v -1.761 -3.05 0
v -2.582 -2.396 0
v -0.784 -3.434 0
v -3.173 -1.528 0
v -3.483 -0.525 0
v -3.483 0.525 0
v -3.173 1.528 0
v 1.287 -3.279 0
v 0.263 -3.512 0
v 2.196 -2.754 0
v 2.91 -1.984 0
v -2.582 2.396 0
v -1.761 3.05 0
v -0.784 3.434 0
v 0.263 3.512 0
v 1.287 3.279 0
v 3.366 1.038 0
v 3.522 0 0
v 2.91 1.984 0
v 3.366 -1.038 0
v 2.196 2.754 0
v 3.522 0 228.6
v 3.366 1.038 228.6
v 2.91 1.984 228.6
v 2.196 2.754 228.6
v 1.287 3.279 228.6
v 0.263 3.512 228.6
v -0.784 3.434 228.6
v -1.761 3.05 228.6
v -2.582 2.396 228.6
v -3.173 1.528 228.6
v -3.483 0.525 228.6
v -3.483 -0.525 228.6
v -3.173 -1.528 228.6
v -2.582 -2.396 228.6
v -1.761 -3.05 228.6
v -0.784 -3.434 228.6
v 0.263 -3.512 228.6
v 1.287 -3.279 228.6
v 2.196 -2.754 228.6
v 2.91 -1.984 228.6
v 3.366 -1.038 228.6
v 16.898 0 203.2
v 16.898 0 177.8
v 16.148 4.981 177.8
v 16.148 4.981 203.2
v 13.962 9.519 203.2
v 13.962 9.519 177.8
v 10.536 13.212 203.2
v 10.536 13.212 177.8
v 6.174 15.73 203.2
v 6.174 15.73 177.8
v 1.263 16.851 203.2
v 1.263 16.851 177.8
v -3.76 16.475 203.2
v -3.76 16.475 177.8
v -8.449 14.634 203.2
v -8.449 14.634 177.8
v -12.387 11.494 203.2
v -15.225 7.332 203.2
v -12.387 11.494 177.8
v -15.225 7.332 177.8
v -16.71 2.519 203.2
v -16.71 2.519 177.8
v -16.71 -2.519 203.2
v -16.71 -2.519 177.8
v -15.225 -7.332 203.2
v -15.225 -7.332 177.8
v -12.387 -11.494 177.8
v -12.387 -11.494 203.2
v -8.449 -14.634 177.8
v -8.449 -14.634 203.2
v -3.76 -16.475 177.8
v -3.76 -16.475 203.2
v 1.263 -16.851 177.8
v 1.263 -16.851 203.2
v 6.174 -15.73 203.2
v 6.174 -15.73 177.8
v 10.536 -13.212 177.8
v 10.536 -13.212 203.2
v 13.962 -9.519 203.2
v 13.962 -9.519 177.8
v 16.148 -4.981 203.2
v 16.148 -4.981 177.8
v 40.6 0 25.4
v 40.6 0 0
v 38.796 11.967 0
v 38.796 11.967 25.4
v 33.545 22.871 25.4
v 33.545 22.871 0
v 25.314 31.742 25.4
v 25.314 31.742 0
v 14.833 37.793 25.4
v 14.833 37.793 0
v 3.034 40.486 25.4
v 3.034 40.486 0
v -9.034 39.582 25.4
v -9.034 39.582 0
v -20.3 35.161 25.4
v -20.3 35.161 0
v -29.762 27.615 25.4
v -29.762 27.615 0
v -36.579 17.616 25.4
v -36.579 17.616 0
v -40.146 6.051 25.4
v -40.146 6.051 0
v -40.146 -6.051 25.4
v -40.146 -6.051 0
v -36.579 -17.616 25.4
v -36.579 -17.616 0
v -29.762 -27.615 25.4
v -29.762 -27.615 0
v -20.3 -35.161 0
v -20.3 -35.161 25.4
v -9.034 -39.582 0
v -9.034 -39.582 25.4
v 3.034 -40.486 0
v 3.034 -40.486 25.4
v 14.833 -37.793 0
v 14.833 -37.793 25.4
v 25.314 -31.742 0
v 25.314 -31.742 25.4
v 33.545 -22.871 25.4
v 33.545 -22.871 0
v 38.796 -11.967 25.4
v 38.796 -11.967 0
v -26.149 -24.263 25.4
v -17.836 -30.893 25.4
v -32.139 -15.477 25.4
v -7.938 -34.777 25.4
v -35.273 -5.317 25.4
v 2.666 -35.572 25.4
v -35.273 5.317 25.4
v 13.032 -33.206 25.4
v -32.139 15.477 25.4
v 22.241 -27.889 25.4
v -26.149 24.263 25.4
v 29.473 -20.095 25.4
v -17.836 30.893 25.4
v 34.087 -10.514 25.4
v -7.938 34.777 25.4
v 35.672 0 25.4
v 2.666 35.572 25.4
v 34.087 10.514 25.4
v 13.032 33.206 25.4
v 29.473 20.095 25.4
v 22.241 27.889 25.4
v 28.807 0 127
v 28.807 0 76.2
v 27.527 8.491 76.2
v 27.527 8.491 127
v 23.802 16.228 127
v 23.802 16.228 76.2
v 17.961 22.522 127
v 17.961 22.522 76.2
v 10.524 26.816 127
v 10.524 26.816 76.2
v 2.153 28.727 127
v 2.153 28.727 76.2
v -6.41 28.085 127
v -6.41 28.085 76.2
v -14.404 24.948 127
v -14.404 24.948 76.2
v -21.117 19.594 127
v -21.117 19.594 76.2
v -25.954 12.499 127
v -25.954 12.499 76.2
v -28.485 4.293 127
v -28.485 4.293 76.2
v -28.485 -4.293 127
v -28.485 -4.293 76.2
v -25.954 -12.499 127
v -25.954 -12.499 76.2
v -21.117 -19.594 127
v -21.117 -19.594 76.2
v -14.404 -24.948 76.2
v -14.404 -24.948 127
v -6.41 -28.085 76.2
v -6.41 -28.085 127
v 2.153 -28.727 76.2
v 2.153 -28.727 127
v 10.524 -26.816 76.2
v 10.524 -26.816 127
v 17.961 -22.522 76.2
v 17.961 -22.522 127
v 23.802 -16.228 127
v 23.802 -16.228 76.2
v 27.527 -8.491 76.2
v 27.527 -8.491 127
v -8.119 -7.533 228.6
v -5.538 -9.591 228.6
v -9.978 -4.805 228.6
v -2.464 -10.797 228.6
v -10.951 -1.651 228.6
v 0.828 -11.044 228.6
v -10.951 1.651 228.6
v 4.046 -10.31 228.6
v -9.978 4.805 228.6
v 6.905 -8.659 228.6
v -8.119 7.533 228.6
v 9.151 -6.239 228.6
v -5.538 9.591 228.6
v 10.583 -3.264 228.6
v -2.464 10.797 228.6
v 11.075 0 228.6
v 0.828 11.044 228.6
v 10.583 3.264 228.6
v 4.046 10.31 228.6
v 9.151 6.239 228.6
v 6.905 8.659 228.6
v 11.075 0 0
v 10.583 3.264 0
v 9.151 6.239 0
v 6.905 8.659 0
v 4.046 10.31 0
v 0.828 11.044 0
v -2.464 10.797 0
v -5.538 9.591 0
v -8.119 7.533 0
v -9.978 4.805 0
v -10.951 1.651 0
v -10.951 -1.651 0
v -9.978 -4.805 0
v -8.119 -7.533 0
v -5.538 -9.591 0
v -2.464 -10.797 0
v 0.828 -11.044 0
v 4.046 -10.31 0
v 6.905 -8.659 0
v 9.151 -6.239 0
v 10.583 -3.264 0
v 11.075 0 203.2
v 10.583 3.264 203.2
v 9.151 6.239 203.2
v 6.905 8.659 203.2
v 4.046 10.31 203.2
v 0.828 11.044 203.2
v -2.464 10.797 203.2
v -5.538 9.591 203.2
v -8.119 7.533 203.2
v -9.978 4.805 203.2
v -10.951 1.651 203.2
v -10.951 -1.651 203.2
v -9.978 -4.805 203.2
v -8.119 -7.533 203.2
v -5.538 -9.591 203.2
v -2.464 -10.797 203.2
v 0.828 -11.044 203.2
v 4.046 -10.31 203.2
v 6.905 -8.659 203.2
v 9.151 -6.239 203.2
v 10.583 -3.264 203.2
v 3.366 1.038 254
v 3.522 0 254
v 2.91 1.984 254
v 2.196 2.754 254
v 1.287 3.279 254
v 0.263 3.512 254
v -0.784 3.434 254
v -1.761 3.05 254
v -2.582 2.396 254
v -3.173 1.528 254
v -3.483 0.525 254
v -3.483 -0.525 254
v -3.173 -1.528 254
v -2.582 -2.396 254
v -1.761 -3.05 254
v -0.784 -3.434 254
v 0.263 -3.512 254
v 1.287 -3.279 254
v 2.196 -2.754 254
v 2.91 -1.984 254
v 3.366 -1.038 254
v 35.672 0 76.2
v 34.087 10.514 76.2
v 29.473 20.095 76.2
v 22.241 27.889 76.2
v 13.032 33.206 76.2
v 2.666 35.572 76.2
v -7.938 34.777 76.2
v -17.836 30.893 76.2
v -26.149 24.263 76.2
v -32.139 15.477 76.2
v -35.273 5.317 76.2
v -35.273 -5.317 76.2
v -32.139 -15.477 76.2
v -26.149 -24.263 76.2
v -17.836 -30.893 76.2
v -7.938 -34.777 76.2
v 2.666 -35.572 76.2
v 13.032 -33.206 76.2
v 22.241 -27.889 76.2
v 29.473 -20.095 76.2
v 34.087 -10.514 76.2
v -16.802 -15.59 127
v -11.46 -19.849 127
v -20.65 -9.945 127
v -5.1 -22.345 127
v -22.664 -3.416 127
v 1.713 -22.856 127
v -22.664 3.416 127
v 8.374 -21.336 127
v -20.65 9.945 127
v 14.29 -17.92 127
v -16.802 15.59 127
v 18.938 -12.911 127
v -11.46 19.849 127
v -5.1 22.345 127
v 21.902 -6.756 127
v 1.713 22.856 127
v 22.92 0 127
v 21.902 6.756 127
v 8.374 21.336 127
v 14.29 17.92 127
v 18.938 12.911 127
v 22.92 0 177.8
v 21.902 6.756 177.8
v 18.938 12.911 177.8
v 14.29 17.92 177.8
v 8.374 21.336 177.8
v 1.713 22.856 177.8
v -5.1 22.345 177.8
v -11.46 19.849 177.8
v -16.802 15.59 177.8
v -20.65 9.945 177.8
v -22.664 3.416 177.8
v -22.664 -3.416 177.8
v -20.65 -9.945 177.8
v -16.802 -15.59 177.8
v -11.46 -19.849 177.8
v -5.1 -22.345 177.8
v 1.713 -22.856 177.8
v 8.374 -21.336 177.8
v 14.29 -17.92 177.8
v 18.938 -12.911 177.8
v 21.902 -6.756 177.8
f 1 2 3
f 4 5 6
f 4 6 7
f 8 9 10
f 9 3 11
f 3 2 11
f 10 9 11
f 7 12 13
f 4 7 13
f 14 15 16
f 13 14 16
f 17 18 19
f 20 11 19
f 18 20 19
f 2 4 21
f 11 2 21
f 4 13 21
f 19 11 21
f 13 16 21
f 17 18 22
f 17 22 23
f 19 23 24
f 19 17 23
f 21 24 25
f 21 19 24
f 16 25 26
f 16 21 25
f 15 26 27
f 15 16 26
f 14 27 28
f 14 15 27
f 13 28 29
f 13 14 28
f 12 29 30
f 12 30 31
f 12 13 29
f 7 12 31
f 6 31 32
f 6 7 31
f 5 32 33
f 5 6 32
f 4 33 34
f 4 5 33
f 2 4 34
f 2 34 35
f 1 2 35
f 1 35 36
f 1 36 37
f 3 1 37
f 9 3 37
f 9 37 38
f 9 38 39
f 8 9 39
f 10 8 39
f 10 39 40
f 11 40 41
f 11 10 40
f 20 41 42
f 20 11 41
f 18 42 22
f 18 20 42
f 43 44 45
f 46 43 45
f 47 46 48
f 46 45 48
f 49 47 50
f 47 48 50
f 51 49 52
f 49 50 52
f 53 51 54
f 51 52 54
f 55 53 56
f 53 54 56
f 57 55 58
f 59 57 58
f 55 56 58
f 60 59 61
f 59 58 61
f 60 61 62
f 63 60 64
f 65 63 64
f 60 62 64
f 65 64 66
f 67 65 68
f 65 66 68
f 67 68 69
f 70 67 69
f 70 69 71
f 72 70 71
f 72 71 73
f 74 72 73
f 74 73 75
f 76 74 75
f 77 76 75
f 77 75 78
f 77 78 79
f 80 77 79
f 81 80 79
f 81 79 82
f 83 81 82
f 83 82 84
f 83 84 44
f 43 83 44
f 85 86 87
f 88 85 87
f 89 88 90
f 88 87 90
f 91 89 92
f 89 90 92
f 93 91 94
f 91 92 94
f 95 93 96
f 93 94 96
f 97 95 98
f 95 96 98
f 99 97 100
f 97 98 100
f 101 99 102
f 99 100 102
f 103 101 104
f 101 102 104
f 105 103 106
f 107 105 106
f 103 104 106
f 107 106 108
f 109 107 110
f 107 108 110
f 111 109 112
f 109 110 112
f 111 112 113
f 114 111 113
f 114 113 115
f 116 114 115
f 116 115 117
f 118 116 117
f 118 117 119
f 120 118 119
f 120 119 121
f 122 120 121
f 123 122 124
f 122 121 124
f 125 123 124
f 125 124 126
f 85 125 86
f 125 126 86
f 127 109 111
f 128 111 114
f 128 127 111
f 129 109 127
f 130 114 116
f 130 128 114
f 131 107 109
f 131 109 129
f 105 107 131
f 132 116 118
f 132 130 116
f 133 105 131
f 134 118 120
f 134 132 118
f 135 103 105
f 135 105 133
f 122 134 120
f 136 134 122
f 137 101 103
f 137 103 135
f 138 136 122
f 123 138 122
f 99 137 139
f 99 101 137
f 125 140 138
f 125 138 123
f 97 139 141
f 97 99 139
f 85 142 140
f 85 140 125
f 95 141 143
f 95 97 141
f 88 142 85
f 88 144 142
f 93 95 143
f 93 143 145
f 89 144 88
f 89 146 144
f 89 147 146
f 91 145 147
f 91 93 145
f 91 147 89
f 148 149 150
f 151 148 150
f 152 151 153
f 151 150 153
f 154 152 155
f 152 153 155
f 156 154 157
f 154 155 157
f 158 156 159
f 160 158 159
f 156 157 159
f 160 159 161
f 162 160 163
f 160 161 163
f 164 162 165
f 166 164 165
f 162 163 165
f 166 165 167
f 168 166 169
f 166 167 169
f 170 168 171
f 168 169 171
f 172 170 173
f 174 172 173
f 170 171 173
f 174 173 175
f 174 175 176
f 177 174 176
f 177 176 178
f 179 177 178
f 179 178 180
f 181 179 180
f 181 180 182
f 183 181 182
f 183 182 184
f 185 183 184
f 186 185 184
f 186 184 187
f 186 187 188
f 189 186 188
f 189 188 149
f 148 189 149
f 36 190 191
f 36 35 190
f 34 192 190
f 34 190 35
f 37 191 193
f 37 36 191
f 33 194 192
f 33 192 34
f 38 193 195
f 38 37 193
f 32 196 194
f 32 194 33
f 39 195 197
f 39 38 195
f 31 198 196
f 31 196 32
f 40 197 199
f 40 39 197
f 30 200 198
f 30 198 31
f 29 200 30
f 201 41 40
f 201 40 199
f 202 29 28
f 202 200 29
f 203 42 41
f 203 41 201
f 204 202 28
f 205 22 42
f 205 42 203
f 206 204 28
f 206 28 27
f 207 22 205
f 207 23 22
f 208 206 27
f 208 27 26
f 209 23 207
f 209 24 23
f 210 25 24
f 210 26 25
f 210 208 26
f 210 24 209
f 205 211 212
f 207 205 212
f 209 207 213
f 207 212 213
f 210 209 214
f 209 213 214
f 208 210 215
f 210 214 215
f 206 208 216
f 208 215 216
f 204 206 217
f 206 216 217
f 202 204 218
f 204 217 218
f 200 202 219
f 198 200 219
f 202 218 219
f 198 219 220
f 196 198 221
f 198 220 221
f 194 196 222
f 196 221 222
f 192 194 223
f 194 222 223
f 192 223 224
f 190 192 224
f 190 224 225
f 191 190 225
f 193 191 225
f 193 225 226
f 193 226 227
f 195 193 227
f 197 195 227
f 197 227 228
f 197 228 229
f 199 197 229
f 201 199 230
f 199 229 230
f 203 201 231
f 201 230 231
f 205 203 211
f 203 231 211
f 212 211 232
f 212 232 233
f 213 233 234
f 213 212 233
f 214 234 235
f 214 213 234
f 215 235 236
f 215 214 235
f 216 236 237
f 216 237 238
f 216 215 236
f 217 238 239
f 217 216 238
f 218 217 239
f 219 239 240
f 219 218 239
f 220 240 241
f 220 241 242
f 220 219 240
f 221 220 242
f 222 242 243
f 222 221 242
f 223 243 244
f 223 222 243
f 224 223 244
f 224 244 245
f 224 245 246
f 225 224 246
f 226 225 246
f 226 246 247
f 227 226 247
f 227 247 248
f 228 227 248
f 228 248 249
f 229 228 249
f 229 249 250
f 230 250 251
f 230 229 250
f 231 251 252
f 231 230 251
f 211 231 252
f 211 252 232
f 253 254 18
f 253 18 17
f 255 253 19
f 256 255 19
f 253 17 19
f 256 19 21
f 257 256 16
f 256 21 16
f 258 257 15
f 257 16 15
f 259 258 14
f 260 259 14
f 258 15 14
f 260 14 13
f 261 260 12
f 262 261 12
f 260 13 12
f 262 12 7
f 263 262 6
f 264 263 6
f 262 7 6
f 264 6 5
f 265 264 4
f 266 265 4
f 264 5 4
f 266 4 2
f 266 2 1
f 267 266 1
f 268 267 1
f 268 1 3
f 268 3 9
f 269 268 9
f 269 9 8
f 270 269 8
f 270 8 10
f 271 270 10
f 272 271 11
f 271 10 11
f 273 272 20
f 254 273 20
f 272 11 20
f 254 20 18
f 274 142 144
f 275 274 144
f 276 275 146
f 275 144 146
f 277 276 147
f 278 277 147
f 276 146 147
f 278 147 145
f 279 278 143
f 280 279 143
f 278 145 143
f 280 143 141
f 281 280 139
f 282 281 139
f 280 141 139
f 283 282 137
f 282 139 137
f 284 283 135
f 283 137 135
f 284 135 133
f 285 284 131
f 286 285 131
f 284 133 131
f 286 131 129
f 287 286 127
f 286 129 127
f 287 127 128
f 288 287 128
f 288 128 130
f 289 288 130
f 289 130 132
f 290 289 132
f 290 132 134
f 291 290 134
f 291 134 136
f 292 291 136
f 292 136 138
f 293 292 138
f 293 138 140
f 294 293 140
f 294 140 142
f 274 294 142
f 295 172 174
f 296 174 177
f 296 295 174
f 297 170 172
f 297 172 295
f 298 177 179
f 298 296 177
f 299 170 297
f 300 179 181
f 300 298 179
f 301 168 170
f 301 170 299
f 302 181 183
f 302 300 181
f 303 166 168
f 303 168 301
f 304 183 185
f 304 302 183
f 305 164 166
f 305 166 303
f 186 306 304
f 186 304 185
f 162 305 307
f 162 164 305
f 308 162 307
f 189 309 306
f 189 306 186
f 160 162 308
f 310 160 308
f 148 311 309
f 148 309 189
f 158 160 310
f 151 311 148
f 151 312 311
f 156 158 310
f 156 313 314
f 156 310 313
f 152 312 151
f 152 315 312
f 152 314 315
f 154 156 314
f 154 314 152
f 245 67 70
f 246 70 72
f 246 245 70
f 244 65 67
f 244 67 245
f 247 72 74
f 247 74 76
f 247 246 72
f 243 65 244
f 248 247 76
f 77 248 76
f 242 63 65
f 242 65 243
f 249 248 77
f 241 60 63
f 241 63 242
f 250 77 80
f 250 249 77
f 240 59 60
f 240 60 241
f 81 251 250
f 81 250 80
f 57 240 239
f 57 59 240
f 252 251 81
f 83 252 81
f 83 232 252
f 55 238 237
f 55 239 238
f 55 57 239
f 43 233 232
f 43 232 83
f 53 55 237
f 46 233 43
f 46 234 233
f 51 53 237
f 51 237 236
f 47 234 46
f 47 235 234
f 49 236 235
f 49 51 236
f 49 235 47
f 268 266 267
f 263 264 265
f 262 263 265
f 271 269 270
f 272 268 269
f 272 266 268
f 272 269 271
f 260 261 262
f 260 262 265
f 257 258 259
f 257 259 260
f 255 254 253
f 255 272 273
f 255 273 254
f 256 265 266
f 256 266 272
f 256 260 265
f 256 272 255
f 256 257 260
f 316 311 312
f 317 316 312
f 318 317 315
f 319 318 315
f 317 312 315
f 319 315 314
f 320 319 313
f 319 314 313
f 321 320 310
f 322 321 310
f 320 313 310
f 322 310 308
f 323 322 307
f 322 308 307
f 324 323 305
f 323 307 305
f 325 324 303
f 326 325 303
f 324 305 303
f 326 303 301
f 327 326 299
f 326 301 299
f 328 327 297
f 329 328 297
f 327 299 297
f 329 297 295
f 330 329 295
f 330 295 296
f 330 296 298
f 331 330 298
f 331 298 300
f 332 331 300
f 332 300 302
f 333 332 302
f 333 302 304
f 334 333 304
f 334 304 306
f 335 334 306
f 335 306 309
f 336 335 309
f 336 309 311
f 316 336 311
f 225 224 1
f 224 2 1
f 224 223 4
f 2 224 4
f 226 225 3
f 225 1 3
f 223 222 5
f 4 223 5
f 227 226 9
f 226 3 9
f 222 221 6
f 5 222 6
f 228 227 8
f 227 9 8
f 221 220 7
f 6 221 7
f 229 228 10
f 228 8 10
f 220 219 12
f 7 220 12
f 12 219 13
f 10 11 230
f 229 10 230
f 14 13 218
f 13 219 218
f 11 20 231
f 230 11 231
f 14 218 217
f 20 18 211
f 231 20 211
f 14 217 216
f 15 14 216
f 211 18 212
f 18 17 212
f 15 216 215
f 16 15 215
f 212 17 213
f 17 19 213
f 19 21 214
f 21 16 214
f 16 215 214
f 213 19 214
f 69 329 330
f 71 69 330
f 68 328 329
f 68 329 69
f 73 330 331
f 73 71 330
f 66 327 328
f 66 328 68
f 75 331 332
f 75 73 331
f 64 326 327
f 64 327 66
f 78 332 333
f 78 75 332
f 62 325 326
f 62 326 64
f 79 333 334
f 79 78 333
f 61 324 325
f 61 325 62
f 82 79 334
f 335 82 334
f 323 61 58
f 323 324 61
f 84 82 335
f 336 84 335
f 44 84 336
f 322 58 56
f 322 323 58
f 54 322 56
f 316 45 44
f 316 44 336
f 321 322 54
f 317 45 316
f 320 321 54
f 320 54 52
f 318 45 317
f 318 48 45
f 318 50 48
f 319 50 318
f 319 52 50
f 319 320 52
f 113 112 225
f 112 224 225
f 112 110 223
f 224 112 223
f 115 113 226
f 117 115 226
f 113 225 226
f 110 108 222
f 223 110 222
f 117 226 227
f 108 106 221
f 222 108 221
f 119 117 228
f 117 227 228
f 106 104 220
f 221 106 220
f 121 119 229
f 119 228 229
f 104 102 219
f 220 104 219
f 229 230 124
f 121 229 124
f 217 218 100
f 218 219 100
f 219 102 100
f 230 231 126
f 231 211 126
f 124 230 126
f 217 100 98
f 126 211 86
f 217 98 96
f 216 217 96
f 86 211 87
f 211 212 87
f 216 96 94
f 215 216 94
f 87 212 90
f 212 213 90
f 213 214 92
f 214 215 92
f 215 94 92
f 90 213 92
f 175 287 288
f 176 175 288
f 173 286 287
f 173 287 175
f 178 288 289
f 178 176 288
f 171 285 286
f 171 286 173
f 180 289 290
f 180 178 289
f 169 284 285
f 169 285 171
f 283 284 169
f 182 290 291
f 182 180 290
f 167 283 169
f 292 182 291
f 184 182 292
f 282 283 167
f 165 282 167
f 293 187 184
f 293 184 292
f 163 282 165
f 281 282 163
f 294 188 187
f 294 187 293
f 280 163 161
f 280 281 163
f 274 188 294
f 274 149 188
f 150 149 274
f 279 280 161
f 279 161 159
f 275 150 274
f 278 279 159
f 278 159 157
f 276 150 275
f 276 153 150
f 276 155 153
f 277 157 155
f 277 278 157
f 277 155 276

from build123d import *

# Parameters (mm, degrees)
F0_R     = 3.522094475
F1_DEPTH = 254
F0_R_2   = 40.599940794
F0_R_3   = 35.6715893611
F2_DEPTH = 25.4
F0_R_4   = 28.8071763317
F3_DEPTH = 76.2
F0_R_5   = 22.9201353623
F4_DEPTH = 127
F0_R_6   = 16.8984108621
F5_DEPTH = 177.8
F0_R_7   = 11.0751082581
F6_DEPTH = 203.2
F7_DEPTH = 228.6


# Not quite as in the source:
# - the program builds the solid bodies; features that only make, move or delete a surface that nothing else refers to are left out


with BuildPart() as f1:
    # F0 (on Top) → F1 (new body)
    with BuildSketch(Plane.XY):
        Circle(F0_R)
    extrude(amount=F1_DEPTH)


with BuildPart() as f2:
    # F0 (on Top) → F2 (new body)
    with BuildSketch(Plane.XY):
        Circle(F0_R_2)
        Circle(F0_R_3, mode=Mode.SUBTRACT)
    extrude(amount=F2_DEPTH)

    # F0 (on Top) → F3 (join)
    with BuildSketch(Plane.XY):
        Circle(F0_R_3)
        Circle(F0_R_4, mode=Mode.SUBTRACT)
    extrude(amount=F3_DEPTH)

    # F0 (on Top) → F4 (join)
    with BuildSketch(Plane.XY):
        Circle(F0_R_4)
        Circle(F0_R_5, mode=Mode.SUBTRACT)
    extrude(amount=F4_DEPTH)

    # F0 (on Top) → F5 (join)
    with BuildSketch(Plane.XY):
        Circle(F0_R_5)
        Circle(F0_R_6, mode=Mode.SUBTRACT)
    extrude(amount=F5_DEPTH)

    # F0 (on Top) → F6 (join)
    with BuildSketch(Plane.XY):
        Circle(F0_R_6)
        Circle(F0_R_7, mode=Mode.SUBTRACT)
    extrude(amount=F6_DEPTH)


with BuildPart() as f7:
    # F0 (on Top) → F7 (new body)
    with BuildSketch(Plane.XY):
        Circle(F0_R_7)
        Circle(F0_R, mode=Mode.SUBTRACT)
    extrude(amount=F7_DEPTH)


solid = Compound([f1.part, f2.part, f7.part])
